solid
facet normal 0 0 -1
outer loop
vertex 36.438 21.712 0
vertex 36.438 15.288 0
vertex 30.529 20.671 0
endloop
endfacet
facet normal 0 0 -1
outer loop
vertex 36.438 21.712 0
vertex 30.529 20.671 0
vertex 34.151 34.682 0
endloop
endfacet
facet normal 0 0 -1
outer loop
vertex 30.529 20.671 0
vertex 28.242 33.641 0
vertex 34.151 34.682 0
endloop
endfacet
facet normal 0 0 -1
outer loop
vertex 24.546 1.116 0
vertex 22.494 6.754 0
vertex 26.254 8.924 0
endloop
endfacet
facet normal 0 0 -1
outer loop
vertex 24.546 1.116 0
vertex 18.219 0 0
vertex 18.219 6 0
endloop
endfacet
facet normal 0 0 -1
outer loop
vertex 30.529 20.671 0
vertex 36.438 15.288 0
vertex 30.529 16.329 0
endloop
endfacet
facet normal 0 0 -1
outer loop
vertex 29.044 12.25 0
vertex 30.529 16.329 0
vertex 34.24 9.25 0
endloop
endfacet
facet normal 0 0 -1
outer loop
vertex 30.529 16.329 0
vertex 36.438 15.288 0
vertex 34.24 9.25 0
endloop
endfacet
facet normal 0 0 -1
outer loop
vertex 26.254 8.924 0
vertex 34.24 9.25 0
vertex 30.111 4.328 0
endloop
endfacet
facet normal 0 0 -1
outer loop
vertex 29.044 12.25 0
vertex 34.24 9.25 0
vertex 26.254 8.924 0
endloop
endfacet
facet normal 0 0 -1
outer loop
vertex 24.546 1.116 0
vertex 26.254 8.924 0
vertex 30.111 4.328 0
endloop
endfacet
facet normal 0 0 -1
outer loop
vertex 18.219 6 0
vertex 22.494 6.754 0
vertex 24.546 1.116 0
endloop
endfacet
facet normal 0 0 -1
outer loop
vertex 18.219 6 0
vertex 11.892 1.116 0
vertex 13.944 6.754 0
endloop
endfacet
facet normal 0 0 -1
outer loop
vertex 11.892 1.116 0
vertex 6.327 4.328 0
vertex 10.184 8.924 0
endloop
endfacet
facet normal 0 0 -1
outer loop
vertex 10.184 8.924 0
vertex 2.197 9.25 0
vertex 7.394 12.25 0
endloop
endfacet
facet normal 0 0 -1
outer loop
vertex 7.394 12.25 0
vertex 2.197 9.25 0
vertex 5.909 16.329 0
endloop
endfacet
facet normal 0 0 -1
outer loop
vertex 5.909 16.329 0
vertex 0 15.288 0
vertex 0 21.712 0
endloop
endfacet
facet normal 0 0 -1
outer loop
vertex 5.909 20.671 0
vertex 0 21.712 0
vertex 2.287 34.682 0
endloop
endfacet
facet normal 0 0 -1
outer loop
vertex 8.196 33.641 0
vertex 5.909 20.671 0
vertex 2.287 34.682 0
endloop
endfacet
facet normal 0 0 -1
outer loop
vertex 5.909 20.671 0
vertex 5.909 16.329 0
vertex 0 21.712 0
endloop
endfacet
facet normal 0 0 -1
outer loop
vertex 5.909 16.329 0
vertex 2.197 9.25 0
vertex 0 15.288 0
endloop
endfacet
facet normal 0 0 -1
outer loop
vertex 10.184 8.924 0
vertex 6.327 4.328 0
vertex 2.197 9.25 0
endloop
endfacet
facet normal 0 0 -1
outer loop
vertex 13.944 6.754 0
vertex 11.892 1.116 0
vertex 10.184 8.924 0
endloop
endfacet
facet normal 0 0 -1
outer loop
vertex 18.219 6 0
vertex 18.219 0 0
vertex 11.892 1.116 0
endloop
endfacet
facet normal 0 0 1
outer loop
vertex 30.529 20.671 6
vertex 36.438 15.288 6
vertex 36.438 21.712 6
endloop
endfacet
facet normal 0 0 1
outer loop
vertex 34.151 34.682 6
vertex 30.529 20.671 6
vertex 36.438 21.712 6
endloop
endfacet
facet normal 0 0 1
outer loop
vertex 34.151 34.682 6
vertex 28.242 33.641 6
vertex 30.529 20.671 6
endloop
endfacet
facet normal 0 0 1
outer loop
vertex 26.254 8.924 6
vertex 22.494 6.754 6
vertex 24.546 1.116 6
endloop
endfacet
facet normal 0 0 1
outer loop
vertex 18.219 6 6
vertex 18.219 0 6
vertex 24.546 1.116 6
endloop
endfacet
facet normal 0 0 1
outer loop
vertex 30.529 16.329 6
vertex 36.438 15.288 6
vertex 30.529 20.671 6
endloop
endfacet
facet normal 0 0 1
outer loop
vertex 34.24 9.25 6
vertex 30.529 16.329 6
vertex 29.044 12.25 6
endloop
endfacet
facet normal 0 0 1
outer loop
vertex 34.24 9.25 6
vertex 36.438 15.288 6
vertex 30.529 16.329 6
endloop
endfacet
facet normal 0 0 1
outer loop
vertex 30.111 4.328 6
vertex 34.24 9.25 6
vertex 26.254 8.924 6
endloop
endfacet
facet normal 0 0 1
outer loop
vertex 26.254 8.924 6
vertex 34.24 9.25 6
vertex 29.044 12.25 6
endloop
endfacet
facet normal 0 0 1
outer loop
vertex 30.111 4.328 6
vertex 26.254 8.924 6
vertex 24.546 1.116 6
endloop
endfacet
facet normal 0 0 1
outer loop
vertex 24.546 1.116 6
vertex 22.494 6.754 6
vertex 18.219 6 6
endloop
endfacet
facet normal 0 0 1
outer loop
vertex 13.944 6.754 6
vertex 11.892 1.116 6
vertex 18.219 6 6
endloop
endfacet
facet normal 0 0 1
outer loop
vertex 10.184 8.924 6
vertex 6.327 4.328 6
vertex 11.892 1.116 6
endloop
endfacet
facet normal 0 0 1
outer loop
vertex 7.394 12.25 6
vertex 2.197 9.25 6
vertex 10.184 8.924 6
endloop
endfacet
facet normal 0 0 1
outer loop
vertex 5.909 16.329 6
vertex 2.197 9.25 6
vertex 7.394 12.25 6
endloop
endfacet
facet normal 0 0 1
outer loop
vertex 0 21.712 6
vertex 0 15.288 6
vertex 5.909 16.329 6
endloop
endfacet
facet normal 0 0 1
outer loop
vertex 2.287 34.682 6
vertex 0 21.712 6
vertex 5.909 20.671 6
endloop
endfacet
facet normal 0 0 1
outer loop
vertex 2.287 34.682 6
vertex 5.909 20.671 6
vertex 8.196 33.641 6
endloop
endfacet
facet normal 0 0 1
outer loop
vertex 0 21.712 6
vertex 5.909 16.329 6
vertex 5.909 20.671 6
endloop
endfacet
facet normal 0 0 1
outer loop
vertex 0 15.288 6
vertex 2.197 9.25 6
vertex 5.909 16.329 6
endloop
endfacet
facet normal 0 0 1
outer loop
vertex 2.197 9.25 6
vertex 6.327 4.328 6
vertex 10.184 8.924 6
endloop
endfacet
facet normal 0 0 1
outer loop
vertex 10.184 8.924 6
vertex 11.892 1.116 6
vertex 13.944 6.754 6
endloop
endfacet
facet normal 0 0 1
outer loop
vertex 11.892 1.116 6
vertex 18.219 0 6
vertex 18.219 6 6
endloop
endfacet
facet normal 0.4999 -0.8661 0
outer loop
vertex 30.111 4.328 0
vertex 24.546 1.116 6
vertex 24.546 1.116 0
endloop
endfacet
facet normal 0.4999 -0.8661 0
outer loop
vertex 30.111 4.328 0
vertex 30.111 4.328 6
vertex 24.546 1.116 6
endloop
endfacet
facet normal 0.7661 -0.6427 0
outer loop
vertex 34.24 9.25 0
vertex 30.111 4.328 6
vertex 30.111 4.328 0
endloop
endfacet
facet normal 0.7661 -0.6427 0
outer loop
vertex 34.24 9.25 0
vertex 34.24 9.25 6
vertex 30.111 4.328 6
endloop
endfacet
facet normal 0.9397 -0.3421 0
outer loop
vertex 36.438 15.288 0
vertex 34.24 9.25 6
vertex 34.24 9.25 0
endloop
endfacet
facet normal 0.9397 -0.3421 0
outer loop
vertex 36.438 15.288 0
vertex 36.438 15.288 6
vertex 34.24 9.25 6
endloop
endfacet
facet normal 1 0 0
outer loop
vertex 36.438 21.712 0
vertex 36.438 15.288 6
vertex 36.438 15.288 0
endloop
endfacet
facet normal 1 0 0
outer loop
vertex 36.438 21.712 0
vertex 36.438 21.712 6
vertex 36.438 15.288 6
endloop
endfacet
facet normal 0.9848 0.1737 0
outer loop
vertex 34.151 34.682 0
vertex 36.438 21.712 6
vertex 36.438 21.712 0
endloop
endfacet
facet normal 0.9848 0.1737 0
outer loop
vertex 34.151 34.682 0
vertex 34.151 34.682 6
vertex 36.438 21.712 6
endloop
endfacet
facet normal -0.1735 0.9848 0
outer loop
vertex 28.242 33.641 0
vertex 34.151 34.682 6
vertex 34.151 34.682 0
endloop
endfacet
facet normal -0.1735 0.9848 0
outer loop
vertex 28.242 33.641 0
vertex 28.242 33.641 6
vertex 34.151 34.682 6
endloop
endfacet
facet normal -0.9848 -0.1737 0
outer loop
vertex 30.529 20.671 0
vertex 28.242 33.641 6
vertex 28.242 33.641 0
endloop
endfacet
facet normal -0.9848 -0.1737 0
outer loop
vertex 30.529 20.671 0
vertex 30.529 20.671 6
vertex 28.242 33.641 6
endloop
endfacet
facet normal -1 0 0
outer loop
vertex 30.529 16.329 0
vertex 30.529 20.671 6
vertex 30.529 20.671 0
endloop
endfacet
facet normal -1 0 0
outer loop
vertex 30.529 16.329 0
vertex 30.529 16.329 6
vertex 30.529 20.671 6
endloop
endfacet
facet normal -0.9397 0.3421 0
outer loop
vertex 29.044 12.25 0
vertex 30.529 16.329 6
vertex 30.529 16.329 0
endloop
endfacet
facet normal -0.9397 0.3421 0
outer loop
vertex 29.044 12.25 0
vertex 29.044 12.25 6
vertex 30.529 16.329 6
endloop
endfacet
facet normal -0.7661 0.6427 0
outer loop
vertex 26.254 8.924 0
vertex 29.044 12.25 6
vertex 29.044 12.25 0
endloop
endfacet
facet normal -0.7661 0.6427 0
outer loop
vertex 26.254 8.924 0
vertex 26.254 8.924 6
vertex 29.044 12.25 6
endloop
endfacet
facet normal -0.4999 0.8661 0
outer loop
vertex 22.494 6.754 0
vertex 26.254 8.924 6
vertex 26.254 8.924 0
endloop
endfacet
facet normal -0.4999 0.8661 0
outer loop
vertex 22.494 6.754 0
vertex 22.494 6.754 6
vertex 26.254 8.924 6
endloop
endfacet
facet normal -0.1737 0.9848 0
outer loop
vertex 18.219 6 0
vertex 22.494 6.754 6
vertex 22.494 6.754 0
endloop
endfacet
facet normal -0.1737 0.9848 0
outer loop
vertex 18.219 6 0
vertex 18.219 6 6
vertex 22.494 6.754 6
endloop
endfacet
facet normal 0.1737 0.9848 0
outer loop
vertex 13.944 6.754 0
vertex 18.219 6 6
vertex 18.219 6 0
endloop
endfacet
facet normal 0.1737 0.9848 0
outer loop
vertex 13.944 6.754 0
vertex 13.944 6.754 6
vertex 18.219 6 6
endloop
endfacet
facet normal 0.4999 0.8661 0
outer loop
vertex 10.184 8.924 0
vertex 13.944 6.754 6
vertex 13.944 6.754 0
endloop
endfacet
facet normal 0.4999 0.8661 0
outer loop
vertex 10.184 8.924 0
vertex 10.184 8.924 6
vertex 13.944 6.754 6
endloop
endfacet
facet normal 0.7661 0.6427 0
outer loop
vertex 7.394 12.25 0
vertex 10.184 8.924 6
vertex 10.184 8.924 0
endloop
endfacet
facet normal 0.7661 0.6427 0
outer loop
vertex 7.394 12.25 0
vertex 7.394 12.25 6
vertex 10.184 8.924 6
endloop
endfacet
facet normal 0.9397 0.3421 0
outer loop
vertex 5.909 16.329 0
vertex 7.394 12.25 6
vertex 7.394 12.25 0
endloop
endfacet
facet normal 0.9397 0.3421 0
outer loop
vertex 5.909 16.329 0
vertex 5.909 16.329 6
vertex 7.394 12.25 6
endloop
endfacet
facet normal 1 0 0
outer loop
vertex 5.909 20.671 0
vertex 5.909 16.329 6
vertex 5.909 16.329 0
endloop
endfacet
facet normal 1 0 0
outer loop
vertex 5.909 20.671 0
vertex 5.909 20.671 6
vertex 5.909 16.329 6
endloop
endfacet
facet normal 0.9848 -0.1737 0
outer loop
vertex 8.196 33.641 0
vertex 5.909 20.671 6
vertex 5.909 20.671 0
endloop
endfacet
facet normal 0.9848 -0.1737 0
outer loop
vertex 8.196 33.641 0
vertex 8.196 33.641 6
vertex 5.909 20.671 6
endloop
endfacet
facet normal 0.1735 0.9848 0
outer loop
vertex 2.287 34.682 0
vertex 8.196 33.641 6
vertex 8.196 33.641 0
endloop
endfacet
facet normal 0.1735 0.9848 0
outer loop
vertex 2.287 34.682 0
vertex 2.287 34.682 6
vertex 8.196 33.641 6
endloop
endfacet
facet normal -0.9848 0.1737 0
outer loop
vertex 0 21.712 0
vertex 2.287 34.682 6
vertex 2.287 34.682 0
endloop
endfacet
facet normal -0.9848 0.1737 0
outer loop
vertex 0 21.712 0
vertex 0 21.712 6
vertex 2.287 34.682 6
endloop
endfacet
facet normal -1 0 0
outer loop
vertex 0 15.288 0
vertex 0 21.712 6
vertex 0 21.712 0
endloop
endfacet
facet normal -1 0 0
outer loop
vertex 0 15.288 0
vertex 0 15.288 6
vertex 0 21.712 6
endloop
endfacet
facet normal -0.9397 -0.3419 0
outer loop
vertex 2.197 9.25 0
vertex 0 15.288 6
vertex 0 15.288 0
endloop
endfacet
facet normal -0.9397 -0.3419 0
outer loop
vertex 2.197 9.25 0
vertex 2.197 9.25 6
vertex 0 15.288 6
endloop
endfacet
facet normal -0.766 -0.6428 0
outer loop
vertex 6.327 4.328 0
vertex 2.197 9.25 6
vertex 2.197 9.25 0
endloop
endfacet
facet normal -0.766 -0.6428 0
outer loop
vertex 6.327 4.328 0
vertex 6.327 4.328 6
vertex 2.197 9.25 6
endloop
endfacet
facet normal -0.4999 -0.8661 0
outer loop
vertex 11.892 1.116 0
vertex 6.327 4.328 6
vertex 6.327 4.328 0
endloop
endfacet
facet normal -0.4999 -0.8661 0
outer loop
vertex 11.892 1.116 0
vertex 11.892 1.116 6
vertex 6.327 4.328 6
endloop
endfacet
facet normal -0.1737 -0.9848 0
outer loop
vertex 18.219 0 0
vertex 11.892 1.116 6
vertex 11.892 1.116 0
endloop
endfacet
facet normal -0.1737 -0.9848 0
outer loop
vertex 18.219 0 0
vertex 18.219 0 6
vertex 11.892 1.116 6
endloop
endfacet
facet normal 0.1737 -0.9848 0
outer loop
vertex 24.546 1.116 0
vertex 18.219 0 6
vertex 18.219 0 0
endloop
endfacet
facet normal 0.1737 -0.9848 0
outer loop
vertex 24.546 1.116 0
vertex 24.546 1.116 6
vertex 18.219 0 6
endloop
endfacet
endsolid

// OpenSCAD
$fn = 32;

// ----------------------------------------------------------------------
// Clip blank: omega clip, 6 mm thick
// ----------------------------------------------------------------------

// --- parameters (mm) ---
profile_height = 6;       // extrusion height
profile_points = 26;      // points of the closed outline

profile = [[0, 21.712], [0, 15.288], [2.197, 9.25], [6.327, 4.328], [11.892, 1.116], [18.219, 0], [24.546, 1.116], [30.111, 4.328], [34.24, 9.25], [36.438, 15.288], [36.438, 21.712], [34.151, 34.682], [28.242, 33.641], [30.529, 20.671], [30.529, 16.329], [29.044, 12.25], [26.254, 8.924], [22.494, 6.754], [18.219, 6], [13.944, 6.754], [10.184, 8.924], [7.394, 12.25], [5.909, 16.329], [5.909, 20.671], [8.196, 33.641], [2.287, 34.682]];  // single closed polygon, 26 points, counter clockwise

// --- the one profile operation ---
linear_extrude(height = profile_height) polygon(points = profile);
